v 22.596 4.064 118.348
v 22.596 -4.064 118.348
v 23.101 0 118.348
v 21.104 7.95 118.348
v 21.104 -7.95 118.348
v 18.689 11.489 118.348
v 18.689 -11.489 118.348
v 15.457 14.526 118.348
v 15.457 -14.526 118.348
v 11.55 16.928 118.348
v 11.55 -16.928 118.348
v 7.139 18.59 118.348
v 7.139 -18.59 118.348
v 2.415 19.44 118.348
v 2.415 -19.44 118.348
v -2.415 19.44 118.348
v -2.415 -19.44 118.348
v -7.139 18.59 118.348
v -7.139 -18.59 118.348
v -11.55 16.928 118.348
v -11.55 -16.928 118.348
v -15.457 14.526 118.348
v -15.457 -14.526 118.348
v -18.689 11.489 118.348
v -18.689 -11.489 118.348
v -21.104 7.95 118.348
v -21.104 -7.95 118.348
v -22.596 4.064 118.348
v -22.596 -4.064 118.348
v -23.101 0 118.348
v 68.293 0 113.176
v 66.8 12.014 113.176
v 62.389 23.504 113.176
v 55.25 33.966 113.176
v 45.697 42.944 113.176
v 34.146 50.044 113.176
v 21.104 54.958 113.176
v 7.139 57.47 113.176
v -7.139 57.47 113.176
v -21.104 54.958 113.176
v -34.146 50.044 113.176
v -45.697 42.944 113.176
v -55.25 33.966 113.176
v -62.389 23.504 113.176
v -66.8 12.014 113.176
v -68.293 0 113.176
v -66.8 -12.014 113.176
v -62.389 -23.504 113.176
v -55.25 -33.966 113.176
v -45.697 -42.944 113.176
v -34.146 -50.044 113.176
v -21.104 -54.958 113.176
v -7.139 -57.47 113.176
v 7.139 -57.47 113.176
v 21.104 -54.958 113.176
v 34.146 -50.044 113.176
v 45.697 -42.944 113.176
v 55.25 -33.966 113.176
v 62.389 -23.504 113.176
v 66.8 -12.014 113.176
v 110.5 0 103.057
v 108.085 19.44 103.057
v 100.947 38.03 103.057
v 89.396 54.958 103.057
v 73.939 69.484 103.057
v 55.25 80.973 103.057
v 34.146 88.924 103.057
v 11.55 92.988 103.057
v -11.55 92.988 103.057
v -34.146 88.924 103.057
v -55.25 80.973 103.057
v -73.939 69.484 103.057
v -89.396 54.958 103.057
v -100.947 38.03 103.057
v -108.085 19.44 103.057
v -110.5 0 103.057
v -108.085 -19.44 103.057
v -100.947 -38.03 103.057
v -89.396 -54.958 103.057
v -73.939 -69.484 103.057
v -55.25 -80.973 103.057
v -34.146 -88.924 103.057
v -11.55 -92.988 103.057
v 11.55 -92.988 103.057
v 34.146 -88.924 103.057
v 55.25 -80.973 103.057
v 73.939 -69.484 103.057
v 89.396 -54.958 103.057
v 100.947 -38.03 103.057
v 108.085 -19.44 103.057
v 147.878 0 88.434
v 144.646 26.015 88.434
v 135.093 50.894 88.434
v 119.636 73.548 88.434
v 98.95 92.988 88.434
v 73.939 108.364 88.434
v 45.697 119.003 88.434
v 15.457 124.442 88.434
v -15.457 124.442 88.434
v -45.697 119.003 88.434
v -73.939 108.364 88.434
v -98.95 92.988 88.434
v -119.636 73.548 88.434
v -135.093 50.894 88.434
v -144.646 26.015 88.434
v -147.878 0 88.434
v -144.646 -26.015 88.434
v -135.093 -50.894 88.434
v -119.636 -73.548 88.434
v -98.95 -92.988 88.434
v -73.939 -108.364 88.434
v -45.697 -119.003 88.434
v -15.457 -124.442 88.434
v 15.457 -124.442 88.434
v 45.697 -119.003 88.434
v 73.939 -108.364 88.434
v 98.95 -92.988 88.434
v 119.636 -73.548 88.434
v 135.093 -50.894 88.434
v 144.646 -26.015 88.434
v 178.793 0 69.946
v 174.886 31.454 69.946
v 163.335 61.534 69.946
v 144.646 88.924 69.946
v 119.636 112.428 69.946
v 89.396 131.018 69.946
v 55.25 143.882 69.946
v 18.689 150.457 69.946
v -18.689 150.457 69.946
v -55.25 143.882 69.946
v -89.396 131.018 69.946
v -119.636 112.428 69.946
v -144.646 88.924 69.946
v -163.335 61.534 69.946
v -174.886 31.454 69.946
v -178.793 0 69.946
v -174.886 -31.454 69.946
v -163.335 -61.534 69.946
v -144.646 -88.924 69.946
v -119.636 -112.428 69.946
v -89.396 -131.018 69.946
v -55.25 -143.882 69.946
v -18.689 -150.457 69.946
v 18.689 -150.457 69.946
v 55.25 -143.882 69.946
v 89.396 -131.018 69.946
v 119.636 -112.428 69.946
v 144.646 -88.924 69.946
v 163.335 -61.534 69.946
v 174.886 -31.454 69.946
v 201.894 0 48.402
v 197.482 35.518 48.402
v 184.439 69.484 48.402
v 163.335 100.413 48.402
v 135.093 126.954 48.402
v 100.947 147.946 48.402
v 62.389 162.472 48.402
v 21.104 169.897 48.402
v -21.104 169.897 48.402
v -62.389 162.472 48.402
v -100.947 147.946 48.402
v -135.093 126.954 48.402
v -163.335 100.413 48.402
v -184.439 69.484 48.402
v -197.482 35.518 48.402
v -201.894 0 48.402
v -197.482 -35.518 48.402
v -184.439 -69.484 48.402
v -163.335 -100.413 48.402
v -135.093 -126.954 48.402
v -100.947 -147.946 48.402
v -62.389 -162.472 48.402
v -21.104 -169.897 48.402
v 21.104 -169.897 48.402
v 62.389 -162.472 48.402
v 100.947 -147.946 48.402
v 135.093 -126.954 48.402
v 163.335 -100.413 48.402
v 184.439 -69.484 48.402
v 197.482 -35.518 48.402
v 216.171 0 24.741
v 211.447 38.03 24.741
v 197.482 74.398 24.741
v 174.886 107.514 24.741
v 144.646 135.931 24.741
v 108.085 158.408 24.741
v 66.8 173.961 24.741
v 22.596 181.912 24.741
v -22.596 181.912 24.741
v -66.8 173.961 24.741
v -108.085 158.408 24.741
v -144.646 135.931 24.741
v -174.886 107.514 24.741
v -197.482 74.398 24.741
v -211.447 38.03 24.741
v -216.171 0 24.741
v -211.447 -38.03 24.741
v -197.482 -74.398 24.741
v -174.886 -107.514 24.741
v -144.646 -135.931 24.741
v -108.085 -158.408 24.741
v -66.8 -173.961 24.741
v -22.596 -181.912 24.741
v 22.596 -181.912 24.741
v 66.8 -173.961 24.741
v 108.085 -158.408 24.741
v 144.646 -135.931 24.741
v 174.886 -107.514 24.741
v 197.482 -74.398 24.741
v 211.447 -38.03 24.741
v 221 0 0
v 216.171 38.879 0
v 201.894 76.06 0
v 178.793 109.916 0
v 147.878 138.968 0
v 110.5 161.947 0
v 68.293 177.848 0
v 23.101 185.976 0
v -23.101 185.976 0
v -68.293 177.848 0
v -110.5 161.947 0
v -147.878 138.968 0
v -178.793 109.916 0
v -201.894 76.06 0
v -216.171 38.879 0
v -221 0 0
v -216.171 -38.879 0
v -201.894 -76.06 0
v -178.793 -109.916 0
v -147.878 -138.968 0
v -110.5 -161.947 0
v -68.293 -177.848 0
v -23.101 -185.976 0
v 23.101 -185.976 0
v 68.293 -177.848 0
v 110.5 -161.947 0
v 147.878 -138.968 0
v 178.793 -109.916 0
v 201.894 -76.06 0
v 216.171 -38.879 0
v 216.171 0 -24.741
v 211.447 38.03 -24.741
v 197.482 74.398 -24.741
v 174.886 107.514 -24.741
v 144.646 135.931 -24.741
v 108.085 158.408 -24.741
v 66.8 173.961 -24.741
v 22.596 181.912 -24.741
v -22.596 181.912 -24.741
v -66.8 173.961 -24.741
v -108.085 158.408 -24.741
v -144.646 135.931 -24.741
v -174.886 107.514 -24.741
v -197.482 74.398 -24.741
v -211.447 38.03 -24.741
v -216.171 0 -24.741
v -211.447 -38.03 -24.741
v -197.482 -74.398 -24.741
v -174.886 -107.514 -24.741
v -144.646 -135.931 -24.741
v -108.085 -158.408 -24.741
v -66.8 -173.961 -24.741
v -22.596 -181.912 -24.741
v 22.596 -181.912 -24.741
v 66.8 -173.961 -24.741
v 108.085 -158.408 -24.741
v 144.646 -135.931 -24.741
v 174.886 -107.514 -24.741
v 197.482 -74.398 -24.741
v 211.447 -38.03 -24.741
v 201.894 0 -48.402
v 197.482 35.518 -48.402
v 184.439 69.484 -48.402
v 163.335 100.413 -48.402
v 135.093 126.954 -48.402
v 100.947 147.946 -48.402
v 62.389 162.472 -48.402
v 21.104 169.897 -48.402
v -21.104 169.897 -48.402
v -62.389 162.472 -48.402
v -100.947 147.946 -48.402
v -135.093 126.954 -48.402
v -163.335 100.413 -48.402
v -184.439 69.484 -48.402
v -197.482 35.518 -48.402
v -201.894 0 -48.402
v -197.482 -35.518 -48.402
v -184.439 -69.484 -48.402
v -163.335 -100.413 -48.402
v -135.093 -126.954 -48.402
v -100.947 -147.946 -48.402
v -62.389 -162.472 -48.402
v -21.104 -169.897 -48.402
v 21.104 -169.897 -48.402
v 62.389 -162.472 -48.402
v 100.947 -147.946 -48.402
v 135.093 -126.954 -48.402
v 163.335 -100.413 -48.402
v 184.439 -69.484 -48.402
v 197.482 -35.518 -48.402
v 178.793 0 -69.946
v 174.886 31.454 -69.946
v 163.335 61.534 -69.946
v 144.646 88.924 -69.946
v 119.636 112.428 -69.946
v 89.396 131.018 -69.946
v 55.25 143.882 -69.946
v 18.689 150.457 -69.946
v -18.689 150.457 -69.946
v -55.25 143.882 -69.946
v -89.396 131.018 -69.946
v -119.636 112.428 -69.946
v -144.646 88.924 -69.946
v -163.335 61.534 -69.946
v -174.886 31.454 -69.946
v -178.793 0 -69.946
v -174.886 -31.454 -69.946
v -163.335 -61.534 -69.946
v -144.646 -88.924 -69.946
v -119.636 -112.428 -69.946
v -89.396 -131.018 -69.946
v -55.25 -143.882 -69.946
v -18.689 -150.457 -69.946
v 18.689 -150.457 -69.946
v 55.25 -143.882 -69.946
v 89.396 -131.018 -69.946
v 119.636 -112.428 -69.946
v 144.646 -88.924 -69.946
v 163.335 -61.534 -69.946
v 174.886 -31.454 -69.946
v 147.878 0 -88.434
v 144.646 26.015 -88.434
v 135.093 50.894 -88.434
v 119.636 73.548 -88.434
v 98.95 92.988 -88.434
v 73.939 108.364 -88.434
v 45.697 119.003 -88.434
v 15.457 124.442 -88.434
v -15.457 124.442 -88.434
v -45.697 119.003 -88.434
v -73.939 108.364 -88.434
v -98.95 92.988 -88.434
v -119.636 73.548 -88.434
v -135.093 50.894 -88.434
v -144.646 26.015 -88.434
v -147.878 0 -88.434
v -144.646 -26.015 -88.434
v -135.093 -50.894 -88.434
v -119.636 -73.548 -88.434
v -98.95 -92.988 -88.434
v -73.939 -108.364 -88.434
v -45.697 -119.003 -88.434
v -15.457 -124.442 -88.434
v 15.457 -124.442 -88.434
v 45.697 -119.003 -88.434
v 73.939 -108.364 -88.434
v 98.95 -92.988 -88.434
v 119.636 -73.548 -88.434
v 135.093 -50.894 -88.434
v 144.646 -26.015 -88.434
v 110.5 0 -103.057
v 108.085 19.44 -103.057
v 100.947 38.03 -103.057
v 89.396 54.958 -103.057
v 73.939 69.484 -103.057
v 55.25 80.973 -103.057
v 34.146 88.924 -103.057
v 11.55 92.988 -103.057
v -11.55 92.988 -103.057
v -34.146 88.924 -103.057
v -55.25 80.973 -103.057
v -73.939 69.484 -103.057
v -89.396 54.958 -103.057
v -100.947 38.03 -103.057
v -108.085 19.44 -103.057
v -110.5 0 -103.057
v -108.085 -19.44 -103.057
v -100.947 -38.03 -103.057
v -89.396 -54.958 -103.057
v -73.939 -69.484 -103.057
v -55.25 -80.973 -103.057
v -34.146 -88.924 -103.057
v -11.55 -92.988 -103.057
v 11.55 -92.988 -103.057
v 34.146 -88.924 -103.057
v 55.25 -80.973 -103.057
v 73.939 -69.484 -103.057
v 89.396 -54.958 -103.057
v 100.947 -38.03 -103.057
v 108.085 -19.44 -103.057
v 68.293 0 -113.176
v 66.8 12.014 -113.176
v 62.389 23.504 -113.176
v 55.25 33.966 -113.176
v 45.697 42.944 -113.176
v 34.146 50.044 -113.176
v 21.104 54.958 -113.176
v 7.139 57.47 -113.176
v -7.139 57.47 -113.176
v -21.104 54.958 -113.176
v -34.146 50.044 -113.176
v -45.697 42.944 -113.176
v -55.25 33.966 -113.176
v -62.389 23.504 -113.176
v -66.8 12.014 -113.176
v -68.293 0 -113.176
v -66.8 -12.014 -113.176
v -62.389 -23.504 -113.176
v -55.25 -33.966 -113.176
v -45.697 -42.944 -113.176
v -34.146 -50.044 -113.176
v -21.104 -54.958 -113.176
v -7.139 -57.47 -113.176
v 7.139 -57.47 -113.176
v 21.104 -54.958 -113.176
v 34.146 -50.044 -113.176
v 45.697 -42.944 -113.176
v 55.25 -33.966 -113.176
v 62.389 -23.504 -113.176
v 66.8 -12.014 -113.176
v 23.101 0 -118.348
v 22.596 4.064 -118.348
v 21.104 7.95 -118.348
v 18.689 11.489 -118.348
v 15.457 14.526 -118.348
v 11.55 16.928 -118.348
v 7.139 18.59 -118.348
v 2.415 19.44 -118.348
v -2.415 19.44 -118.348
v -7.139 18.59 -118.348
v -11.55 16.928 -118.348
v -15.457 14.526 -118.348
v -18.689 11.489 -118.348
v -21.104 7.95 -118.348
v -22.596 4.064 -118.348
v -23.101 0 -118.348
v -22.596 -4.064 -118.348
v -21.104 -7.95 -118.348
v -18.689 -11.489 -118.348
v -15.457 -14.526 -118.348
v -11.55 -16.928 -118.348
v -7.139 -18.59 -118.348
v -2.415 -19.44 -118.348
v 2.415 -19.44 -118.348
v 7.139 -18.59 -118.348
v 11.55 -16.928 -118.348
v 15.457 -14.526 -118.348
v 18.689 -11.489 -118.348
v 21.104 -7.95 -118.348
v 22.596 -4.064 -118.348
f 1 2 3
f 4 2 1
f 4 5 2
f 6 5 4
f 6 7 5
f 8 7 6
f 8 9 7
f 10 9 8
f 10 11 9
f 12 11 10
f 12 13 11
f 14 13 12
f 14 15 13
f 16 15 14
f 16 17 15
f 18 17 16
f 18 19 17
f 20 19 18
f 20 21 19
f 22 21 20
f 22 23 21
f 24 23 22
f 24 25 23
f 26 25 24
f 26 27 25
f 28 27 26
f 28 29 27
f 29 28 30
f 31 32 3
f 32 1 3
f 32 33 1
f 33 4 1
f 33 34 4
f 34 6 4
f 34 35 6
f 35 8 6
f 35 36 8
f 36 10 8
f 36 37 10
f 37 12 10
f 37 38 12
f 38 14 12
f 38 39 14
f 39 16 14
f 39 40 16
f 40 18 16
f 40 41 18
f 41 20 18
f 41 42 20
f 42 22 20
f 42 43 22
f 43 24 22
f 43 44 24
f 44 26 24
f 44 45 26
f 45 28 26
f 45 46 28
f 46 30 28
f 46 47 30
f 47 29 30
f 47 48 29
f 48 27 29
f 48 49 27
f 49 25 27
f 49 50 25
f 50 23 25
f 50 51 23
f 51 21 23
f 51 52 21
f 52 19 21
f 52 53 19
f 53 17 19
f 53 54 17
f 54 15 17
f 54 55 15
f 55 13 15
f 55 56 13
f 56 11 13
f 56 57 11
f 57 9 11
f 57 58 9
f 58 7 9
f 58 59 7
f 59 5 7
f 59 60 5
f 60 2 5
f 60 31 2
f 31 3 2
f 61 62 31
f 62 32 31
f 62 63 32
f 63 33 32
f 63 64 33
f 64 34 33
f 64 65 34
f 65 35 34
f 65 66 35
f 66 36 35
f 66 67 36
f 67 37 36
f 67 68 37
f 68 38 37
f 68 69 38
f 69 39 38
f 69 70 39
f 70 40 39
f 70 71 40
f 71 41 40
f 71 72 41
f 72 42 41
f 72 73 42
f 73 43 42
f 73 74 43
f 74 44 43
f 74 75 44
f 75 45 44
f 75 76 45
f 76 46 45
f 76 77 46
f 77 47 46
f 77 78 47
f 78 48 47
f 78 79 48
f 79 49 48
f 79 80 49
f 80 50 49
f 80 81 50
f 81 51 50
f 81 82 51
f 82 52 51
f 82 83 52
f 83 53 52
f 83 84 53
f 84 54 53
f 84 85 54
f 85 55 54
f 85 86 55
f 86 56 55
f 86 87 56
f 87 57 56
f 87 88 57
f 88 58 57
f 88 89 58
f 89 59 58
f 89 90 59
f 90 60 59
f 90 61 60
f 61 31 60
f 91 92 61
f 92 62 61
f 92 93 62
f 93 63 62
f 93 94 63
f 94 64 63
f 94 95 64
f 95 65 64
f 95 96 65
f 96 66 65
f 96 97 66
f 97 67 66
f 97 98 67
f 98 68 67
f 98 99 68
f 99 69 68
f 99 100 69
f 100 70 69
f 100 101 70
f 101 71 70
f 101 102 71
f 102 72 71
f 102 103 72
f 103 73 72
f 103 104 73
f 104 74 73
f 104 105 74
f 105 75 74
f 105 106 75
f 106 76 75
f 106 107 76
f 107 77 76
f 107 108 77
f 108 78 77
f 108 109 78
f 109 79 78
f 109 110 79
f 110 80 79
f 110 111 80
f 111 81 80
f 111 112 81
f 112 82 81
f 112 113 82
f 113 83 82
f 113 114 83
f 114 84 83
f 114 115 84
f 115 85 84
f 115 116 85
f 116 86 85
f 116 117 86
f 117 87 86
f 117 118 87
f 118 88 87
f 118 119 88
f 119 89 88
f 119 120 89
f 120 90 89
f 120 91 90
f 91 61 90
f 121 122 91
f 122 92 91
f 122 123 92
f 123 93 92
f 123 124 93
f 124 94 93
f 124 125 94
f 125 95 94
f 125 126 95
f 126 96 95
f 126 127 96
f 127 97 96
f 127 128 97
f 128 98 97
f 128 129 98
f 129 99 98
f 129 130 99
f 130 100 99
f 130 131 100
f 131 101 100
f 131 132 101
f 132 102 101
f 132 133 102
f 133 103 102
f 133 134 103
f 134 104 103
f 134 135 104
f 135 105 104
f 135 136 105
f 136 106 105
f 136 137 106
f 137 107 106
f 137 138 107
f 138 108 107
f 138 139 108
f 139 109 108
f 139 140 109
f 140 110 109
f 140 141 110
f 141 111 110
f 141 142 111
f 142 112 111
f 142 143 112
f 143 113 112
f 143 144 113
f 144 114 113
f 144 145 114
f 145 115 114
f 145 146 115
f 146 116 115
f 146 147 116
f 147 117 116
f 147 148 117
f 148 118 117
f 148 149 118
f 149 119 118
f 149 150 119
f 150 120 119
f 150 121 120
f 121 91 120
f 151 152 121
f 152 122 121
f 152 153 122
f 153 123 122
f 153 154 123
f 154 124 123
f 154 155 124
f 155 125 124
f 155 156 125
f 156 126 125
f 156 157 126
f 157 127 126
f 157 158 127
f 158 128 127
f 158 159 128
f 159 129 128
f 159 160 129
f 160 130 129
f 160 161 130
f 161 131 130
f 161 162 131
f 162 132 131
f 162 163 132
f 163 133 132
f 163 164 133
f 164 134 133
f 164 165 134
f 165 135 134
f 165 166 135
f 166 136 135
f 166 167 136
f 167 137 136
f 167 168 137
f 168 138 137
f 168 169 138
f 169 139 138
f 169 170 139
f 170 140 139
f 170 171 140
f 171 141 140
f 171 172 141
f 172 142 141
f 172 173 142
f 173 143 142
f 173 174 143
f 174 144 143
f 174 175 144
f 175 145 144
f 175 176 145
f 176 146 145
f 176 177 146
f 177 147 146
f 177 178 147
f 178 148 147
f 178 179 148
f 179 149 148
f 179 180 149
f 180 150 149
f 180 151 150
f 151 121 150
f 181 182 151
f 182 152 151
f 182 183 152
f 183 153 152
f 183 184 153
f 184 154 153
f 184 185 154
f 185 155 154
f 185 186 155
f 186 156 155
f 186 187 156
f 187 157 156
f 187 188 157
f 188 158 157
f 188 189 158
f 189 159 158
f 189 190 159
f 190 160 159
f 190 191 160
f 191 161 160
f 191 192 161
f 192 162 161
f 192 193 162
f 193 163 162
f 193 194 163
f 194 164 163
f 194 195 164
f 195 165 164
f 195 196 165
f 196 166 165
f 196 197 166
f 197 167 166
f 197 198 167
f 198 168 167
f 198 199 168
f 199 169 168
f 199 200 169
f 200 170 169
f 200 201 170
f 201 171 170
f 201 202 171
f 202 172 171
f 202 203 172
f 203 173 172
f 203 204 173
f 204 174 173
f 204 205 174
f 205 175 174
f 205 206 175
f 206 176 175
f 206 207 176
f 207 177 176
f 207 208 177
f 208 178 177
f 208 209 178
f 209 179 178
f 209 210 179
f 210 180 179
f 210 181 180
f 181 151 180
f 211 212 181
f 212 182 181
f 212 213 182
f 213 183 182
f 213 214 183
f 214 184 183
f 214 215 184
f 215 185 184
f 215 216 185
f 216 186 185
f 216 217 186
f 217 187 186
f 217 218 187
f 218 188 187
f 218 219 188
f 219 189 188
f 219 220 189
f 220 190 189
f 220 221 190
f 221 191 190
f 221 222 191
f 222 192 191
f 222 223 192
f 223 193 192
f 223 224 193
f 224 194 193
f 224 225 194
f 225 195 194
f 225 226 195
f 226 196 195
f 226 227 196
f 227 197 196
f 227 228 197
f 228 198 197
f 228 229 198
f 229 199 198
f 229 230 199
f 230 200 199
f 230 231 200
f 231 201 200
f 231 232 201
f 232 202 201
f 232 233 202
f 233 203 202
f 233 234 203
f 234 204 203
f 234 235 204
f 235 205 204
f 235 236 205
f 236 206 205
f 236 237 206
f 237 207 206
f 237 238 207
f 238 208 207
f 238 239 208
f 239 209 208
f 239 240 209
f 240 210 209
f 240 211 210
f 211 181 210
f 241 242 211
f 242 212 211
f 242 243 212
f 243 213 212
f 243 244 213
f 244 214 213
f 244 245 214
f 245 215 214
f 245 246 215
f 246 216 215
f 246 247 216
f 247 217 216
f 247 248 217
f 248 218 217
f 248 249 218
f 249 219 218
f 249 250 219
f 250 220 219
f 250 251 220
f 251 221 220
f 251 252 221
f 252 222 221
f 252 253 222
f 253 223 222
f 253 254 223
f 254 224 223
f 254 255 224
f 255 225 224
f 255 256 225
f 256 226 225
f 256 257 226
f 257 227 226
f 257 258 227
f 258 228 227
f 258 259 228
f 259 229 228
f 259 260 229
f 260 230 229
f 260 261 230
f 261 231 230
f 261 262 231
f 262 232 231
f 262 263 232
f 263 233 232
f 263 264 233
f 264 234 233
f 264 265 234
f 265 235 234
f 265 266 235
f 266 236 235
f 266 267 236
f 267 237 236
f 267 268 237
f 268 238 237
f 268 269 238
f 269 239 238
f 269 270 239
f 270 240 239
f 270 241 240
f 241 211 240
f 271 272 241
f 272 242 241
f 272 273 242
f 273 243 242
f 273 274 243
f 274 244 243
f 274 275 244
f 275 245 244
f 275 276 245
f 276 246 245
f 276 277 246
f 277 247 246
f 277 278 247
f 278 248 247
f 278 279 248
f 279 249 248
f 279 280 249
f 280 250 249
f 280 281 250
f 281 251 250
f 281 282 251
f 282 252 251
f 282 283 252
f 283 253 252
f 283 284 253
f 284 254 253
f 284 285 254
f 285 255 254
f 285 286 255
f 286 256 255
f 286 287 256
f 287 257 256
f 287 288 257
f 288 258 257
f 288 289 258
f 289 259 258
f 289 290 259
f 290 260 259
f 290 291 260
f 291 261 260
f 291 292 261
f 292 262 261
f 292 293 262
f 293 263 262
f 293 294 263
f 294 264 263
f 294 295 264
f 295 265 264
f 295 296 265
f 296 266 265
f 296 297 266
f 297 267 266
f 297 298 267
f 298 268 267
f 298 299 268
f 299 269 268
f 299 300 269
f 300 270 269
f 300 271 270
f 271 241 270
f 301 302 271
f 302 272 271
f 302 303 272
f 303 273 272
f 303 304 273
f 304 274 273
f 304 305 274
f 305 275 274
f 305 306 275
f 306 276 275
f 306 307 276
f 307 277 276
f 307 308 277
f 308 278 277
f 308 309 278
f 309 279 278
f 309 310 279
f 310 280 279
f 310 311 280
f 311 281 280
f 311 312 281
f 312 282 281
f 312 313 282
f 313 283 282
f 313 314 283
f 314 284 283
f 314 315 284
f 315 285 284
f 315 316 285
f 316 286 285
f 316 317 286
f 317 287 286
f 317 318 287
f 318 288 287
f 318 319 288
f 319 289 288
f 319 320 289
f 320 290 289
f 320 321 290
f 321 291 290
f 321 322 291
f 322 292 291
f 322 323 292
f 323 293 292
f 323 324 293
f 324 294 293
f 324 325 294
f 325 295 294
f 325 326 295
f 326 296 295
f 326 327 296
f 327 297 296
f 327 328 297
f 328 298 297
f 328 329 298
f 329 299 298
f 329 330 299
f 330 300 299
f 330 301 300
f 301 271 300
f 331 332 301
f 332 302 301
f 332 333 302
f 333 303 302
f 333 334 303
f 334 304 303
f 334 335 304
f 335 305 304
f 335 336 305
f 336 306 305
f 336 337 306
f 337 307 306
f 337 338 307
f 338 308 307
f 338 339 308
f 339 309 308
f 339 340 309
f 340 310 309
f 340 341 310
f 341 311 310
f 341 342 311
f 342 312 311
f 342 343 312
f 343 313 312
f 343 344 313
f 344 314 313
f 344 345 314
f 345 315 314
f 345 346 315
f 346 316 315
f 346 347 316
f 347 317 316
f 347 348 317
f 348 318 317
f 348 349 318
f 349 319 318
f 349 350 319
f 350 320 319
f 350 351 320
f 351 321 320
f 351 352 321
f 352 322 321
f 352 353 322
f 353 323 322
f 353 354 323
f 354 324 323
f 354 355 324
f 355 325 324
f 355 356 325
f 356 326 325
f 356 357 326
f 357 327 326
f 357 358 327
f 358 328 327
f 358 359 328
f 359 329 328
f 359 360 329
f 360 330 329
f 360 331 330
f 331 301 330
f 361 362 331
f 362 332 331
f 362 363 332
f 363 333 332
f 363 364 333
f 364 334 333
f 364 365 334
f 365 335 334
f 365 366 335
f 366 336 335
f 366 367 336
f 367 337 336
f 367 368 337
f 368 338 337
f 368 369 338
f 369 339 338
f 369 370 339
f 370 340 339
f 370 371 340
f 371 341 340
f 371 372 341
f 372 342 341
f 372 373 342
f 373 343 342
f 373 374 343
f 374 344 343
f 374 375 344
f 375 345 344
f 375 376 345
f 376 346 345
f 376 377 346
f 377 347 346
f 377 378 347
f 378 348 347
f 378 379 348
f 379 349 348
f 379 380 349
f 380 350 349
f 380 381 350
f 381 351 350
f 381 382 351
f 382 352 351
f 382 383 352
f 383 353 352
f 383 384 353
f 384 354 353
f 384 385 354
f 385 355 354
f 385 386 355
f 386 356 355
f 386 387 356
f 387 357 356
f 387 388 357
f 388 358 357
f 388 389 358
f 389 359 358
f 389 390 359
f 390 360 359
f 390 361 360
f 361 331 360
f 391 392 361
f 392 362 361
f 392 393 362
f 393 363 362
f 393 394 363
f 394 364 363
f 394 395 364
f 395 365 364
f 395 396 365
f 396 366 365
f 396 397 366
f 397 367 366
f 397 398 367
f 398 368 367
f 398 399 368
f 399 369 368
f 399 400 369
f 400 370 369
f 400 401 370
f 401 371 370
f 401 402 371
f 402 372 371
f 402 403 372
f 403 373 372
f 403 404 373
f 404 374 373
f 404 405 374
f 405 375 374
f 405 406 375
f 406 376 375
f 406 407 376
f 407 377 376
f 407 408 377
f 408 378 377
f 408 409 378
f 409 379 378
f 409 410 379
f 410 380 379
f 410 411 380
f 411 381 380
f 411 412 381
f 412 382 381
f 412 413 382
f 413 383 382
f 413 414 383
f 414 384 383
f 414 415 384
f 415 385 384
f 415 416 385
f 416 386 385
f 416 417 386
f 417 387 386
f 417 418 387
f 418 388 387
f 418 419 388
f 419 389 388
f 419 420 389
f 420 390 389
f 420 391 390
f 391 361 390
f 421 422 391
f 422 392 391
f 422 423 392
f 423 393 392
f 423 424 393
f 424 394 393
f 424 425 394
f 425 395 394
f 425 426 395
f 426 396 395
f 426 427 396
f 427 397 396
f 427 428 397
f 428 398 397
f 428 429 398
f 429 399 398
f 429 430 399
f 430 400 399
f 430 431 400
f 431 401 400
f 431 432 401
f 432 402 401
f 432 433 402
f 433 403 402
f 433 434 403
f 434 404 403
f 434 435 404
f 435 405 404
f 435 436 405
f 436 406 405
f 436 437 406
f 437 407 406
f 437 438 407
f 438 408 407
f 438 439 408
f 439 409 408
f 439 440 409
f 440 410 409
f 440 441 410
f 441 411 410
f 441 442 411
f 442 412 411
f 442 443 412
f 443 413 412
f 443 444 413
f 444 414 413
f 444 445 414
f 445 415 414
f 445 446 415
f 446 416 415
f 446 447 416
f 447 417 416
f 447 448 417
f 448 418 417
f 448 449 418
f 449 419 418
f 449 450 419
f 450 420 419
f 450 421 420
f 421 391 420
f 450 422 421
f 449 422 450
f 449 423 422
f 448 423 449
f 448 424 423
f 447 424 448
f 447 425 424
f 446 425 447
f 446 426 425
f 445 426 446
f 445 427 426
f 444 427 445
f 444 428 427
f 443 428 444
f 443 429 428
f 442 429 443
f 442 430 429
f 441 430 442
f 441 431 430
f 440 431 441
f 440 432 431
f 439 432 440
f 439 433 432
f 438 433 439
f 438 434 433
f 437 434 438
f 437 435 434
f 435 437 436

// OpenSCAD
// Generated by SolidPython 1.0.1 on 2020-07-29 00:46:50


scale(v = [13, 11, 7]) {
	sphere(r = 17);
}
/***********************************************
*********      SolidPython code:      **********
************************************************
 
# import packages: SolidPython
from solid import *
from solid.utils import *
from itertools import chain, combinations, permutations


class Resize:

    def __init__(self, scad_file):
        self.scad_file = scad_file
        #self.scad_file = import_scad(scad_file)
        # cone/cylinder param:
        self.r1 = 0
        self.r2 = 0
        self.h = 0
        # rectangular prism param:
        self.w = 0
        self.l = 0
        # ellipse param:
        self.r = 0

    # import OpenScad code (file name corresponds to shape)


    # classify shape + parameters
    def assign(self, param1, param2, param3):
        if self.scad_file == 'cone.scad':
            self.r1 = param1
            self.r2 = param2
            self.h = param3
        elif self.scad_file == 'cylinder.scad':
            self.r1 = param1
            self.r2 = param2
            self.h = param3
        elif self.scad_file == 'rectangularPrism.scad':
            self.h = param1
            self.l = param2
            self.w = param3
        else:
            self.r = param1
            self.h = param2

    # resize parameters
    def iterate(self):
        x = range(3, 20, 2)
        i = 1
        if self.scad_file == 'cone.scad':
            tempList = list(permutations(x, 2))
            for temp in tempList:
                param1 = temp[0]
                param2 = temp[1]
                filepath = 'produced_scad_files/' + 'cone' + str(param1) + '_' + str(param2) + '_' + '.scad'
                scad_render_to_file(cylinder(h=param1, r1=param2, r2=0), filepath)

        elif self.scad_file == 'cylinder.scad':
            tempList = list(permutations(x, 3))
            for temp in tempList:
                param1 = temp[0]
                param2 = temp[1]
                filepath = 'produced_scad_files/' + 'cylinder' + str(param1) + '_' + str(param2) + '_' + '.scad'
                scad_render_to_file(cylinder(h=param1, r1=param2, r2=param2), filepath)

        elif self.scad_file == 'rectangularPrism.scad':
            tempList = list(permutations(x, 3))
            for temp in tempList:
                param1 = temp[0]
                param2 = temp[1]
                param3 = temp[2]
                filepath = 'produced_scad_files/' + 'rectangularPrism' + str(param1) + '_' + str(param2) + '_' + str(
                    param3) + '.scad'
                scad_render_to_file(cube(size=(param1, param2, param3)), filepath)

        elif self.scad_file == 'ellipse.scad':
            tempList = list(permutations(x, 4))
            for temp in tempList:
                param1 = temp[0]
                param2 = temp[1]
                param3 = temp[2]
                param4 = temp[3]
                filepath = 'produced_scad_files/' + 'ellipse' + str(param1) + '_' + str(param2) + '_' + str(param3) + '_' + str(param4) + '.scad'
                scad_render_to_file(scale([param1, param2, param3])(sphere(r=param4)), filepath)

    def render_to_scadfile(self):
        scad_render_to_file(scad, 'example.scad') 
 
************************************************/
